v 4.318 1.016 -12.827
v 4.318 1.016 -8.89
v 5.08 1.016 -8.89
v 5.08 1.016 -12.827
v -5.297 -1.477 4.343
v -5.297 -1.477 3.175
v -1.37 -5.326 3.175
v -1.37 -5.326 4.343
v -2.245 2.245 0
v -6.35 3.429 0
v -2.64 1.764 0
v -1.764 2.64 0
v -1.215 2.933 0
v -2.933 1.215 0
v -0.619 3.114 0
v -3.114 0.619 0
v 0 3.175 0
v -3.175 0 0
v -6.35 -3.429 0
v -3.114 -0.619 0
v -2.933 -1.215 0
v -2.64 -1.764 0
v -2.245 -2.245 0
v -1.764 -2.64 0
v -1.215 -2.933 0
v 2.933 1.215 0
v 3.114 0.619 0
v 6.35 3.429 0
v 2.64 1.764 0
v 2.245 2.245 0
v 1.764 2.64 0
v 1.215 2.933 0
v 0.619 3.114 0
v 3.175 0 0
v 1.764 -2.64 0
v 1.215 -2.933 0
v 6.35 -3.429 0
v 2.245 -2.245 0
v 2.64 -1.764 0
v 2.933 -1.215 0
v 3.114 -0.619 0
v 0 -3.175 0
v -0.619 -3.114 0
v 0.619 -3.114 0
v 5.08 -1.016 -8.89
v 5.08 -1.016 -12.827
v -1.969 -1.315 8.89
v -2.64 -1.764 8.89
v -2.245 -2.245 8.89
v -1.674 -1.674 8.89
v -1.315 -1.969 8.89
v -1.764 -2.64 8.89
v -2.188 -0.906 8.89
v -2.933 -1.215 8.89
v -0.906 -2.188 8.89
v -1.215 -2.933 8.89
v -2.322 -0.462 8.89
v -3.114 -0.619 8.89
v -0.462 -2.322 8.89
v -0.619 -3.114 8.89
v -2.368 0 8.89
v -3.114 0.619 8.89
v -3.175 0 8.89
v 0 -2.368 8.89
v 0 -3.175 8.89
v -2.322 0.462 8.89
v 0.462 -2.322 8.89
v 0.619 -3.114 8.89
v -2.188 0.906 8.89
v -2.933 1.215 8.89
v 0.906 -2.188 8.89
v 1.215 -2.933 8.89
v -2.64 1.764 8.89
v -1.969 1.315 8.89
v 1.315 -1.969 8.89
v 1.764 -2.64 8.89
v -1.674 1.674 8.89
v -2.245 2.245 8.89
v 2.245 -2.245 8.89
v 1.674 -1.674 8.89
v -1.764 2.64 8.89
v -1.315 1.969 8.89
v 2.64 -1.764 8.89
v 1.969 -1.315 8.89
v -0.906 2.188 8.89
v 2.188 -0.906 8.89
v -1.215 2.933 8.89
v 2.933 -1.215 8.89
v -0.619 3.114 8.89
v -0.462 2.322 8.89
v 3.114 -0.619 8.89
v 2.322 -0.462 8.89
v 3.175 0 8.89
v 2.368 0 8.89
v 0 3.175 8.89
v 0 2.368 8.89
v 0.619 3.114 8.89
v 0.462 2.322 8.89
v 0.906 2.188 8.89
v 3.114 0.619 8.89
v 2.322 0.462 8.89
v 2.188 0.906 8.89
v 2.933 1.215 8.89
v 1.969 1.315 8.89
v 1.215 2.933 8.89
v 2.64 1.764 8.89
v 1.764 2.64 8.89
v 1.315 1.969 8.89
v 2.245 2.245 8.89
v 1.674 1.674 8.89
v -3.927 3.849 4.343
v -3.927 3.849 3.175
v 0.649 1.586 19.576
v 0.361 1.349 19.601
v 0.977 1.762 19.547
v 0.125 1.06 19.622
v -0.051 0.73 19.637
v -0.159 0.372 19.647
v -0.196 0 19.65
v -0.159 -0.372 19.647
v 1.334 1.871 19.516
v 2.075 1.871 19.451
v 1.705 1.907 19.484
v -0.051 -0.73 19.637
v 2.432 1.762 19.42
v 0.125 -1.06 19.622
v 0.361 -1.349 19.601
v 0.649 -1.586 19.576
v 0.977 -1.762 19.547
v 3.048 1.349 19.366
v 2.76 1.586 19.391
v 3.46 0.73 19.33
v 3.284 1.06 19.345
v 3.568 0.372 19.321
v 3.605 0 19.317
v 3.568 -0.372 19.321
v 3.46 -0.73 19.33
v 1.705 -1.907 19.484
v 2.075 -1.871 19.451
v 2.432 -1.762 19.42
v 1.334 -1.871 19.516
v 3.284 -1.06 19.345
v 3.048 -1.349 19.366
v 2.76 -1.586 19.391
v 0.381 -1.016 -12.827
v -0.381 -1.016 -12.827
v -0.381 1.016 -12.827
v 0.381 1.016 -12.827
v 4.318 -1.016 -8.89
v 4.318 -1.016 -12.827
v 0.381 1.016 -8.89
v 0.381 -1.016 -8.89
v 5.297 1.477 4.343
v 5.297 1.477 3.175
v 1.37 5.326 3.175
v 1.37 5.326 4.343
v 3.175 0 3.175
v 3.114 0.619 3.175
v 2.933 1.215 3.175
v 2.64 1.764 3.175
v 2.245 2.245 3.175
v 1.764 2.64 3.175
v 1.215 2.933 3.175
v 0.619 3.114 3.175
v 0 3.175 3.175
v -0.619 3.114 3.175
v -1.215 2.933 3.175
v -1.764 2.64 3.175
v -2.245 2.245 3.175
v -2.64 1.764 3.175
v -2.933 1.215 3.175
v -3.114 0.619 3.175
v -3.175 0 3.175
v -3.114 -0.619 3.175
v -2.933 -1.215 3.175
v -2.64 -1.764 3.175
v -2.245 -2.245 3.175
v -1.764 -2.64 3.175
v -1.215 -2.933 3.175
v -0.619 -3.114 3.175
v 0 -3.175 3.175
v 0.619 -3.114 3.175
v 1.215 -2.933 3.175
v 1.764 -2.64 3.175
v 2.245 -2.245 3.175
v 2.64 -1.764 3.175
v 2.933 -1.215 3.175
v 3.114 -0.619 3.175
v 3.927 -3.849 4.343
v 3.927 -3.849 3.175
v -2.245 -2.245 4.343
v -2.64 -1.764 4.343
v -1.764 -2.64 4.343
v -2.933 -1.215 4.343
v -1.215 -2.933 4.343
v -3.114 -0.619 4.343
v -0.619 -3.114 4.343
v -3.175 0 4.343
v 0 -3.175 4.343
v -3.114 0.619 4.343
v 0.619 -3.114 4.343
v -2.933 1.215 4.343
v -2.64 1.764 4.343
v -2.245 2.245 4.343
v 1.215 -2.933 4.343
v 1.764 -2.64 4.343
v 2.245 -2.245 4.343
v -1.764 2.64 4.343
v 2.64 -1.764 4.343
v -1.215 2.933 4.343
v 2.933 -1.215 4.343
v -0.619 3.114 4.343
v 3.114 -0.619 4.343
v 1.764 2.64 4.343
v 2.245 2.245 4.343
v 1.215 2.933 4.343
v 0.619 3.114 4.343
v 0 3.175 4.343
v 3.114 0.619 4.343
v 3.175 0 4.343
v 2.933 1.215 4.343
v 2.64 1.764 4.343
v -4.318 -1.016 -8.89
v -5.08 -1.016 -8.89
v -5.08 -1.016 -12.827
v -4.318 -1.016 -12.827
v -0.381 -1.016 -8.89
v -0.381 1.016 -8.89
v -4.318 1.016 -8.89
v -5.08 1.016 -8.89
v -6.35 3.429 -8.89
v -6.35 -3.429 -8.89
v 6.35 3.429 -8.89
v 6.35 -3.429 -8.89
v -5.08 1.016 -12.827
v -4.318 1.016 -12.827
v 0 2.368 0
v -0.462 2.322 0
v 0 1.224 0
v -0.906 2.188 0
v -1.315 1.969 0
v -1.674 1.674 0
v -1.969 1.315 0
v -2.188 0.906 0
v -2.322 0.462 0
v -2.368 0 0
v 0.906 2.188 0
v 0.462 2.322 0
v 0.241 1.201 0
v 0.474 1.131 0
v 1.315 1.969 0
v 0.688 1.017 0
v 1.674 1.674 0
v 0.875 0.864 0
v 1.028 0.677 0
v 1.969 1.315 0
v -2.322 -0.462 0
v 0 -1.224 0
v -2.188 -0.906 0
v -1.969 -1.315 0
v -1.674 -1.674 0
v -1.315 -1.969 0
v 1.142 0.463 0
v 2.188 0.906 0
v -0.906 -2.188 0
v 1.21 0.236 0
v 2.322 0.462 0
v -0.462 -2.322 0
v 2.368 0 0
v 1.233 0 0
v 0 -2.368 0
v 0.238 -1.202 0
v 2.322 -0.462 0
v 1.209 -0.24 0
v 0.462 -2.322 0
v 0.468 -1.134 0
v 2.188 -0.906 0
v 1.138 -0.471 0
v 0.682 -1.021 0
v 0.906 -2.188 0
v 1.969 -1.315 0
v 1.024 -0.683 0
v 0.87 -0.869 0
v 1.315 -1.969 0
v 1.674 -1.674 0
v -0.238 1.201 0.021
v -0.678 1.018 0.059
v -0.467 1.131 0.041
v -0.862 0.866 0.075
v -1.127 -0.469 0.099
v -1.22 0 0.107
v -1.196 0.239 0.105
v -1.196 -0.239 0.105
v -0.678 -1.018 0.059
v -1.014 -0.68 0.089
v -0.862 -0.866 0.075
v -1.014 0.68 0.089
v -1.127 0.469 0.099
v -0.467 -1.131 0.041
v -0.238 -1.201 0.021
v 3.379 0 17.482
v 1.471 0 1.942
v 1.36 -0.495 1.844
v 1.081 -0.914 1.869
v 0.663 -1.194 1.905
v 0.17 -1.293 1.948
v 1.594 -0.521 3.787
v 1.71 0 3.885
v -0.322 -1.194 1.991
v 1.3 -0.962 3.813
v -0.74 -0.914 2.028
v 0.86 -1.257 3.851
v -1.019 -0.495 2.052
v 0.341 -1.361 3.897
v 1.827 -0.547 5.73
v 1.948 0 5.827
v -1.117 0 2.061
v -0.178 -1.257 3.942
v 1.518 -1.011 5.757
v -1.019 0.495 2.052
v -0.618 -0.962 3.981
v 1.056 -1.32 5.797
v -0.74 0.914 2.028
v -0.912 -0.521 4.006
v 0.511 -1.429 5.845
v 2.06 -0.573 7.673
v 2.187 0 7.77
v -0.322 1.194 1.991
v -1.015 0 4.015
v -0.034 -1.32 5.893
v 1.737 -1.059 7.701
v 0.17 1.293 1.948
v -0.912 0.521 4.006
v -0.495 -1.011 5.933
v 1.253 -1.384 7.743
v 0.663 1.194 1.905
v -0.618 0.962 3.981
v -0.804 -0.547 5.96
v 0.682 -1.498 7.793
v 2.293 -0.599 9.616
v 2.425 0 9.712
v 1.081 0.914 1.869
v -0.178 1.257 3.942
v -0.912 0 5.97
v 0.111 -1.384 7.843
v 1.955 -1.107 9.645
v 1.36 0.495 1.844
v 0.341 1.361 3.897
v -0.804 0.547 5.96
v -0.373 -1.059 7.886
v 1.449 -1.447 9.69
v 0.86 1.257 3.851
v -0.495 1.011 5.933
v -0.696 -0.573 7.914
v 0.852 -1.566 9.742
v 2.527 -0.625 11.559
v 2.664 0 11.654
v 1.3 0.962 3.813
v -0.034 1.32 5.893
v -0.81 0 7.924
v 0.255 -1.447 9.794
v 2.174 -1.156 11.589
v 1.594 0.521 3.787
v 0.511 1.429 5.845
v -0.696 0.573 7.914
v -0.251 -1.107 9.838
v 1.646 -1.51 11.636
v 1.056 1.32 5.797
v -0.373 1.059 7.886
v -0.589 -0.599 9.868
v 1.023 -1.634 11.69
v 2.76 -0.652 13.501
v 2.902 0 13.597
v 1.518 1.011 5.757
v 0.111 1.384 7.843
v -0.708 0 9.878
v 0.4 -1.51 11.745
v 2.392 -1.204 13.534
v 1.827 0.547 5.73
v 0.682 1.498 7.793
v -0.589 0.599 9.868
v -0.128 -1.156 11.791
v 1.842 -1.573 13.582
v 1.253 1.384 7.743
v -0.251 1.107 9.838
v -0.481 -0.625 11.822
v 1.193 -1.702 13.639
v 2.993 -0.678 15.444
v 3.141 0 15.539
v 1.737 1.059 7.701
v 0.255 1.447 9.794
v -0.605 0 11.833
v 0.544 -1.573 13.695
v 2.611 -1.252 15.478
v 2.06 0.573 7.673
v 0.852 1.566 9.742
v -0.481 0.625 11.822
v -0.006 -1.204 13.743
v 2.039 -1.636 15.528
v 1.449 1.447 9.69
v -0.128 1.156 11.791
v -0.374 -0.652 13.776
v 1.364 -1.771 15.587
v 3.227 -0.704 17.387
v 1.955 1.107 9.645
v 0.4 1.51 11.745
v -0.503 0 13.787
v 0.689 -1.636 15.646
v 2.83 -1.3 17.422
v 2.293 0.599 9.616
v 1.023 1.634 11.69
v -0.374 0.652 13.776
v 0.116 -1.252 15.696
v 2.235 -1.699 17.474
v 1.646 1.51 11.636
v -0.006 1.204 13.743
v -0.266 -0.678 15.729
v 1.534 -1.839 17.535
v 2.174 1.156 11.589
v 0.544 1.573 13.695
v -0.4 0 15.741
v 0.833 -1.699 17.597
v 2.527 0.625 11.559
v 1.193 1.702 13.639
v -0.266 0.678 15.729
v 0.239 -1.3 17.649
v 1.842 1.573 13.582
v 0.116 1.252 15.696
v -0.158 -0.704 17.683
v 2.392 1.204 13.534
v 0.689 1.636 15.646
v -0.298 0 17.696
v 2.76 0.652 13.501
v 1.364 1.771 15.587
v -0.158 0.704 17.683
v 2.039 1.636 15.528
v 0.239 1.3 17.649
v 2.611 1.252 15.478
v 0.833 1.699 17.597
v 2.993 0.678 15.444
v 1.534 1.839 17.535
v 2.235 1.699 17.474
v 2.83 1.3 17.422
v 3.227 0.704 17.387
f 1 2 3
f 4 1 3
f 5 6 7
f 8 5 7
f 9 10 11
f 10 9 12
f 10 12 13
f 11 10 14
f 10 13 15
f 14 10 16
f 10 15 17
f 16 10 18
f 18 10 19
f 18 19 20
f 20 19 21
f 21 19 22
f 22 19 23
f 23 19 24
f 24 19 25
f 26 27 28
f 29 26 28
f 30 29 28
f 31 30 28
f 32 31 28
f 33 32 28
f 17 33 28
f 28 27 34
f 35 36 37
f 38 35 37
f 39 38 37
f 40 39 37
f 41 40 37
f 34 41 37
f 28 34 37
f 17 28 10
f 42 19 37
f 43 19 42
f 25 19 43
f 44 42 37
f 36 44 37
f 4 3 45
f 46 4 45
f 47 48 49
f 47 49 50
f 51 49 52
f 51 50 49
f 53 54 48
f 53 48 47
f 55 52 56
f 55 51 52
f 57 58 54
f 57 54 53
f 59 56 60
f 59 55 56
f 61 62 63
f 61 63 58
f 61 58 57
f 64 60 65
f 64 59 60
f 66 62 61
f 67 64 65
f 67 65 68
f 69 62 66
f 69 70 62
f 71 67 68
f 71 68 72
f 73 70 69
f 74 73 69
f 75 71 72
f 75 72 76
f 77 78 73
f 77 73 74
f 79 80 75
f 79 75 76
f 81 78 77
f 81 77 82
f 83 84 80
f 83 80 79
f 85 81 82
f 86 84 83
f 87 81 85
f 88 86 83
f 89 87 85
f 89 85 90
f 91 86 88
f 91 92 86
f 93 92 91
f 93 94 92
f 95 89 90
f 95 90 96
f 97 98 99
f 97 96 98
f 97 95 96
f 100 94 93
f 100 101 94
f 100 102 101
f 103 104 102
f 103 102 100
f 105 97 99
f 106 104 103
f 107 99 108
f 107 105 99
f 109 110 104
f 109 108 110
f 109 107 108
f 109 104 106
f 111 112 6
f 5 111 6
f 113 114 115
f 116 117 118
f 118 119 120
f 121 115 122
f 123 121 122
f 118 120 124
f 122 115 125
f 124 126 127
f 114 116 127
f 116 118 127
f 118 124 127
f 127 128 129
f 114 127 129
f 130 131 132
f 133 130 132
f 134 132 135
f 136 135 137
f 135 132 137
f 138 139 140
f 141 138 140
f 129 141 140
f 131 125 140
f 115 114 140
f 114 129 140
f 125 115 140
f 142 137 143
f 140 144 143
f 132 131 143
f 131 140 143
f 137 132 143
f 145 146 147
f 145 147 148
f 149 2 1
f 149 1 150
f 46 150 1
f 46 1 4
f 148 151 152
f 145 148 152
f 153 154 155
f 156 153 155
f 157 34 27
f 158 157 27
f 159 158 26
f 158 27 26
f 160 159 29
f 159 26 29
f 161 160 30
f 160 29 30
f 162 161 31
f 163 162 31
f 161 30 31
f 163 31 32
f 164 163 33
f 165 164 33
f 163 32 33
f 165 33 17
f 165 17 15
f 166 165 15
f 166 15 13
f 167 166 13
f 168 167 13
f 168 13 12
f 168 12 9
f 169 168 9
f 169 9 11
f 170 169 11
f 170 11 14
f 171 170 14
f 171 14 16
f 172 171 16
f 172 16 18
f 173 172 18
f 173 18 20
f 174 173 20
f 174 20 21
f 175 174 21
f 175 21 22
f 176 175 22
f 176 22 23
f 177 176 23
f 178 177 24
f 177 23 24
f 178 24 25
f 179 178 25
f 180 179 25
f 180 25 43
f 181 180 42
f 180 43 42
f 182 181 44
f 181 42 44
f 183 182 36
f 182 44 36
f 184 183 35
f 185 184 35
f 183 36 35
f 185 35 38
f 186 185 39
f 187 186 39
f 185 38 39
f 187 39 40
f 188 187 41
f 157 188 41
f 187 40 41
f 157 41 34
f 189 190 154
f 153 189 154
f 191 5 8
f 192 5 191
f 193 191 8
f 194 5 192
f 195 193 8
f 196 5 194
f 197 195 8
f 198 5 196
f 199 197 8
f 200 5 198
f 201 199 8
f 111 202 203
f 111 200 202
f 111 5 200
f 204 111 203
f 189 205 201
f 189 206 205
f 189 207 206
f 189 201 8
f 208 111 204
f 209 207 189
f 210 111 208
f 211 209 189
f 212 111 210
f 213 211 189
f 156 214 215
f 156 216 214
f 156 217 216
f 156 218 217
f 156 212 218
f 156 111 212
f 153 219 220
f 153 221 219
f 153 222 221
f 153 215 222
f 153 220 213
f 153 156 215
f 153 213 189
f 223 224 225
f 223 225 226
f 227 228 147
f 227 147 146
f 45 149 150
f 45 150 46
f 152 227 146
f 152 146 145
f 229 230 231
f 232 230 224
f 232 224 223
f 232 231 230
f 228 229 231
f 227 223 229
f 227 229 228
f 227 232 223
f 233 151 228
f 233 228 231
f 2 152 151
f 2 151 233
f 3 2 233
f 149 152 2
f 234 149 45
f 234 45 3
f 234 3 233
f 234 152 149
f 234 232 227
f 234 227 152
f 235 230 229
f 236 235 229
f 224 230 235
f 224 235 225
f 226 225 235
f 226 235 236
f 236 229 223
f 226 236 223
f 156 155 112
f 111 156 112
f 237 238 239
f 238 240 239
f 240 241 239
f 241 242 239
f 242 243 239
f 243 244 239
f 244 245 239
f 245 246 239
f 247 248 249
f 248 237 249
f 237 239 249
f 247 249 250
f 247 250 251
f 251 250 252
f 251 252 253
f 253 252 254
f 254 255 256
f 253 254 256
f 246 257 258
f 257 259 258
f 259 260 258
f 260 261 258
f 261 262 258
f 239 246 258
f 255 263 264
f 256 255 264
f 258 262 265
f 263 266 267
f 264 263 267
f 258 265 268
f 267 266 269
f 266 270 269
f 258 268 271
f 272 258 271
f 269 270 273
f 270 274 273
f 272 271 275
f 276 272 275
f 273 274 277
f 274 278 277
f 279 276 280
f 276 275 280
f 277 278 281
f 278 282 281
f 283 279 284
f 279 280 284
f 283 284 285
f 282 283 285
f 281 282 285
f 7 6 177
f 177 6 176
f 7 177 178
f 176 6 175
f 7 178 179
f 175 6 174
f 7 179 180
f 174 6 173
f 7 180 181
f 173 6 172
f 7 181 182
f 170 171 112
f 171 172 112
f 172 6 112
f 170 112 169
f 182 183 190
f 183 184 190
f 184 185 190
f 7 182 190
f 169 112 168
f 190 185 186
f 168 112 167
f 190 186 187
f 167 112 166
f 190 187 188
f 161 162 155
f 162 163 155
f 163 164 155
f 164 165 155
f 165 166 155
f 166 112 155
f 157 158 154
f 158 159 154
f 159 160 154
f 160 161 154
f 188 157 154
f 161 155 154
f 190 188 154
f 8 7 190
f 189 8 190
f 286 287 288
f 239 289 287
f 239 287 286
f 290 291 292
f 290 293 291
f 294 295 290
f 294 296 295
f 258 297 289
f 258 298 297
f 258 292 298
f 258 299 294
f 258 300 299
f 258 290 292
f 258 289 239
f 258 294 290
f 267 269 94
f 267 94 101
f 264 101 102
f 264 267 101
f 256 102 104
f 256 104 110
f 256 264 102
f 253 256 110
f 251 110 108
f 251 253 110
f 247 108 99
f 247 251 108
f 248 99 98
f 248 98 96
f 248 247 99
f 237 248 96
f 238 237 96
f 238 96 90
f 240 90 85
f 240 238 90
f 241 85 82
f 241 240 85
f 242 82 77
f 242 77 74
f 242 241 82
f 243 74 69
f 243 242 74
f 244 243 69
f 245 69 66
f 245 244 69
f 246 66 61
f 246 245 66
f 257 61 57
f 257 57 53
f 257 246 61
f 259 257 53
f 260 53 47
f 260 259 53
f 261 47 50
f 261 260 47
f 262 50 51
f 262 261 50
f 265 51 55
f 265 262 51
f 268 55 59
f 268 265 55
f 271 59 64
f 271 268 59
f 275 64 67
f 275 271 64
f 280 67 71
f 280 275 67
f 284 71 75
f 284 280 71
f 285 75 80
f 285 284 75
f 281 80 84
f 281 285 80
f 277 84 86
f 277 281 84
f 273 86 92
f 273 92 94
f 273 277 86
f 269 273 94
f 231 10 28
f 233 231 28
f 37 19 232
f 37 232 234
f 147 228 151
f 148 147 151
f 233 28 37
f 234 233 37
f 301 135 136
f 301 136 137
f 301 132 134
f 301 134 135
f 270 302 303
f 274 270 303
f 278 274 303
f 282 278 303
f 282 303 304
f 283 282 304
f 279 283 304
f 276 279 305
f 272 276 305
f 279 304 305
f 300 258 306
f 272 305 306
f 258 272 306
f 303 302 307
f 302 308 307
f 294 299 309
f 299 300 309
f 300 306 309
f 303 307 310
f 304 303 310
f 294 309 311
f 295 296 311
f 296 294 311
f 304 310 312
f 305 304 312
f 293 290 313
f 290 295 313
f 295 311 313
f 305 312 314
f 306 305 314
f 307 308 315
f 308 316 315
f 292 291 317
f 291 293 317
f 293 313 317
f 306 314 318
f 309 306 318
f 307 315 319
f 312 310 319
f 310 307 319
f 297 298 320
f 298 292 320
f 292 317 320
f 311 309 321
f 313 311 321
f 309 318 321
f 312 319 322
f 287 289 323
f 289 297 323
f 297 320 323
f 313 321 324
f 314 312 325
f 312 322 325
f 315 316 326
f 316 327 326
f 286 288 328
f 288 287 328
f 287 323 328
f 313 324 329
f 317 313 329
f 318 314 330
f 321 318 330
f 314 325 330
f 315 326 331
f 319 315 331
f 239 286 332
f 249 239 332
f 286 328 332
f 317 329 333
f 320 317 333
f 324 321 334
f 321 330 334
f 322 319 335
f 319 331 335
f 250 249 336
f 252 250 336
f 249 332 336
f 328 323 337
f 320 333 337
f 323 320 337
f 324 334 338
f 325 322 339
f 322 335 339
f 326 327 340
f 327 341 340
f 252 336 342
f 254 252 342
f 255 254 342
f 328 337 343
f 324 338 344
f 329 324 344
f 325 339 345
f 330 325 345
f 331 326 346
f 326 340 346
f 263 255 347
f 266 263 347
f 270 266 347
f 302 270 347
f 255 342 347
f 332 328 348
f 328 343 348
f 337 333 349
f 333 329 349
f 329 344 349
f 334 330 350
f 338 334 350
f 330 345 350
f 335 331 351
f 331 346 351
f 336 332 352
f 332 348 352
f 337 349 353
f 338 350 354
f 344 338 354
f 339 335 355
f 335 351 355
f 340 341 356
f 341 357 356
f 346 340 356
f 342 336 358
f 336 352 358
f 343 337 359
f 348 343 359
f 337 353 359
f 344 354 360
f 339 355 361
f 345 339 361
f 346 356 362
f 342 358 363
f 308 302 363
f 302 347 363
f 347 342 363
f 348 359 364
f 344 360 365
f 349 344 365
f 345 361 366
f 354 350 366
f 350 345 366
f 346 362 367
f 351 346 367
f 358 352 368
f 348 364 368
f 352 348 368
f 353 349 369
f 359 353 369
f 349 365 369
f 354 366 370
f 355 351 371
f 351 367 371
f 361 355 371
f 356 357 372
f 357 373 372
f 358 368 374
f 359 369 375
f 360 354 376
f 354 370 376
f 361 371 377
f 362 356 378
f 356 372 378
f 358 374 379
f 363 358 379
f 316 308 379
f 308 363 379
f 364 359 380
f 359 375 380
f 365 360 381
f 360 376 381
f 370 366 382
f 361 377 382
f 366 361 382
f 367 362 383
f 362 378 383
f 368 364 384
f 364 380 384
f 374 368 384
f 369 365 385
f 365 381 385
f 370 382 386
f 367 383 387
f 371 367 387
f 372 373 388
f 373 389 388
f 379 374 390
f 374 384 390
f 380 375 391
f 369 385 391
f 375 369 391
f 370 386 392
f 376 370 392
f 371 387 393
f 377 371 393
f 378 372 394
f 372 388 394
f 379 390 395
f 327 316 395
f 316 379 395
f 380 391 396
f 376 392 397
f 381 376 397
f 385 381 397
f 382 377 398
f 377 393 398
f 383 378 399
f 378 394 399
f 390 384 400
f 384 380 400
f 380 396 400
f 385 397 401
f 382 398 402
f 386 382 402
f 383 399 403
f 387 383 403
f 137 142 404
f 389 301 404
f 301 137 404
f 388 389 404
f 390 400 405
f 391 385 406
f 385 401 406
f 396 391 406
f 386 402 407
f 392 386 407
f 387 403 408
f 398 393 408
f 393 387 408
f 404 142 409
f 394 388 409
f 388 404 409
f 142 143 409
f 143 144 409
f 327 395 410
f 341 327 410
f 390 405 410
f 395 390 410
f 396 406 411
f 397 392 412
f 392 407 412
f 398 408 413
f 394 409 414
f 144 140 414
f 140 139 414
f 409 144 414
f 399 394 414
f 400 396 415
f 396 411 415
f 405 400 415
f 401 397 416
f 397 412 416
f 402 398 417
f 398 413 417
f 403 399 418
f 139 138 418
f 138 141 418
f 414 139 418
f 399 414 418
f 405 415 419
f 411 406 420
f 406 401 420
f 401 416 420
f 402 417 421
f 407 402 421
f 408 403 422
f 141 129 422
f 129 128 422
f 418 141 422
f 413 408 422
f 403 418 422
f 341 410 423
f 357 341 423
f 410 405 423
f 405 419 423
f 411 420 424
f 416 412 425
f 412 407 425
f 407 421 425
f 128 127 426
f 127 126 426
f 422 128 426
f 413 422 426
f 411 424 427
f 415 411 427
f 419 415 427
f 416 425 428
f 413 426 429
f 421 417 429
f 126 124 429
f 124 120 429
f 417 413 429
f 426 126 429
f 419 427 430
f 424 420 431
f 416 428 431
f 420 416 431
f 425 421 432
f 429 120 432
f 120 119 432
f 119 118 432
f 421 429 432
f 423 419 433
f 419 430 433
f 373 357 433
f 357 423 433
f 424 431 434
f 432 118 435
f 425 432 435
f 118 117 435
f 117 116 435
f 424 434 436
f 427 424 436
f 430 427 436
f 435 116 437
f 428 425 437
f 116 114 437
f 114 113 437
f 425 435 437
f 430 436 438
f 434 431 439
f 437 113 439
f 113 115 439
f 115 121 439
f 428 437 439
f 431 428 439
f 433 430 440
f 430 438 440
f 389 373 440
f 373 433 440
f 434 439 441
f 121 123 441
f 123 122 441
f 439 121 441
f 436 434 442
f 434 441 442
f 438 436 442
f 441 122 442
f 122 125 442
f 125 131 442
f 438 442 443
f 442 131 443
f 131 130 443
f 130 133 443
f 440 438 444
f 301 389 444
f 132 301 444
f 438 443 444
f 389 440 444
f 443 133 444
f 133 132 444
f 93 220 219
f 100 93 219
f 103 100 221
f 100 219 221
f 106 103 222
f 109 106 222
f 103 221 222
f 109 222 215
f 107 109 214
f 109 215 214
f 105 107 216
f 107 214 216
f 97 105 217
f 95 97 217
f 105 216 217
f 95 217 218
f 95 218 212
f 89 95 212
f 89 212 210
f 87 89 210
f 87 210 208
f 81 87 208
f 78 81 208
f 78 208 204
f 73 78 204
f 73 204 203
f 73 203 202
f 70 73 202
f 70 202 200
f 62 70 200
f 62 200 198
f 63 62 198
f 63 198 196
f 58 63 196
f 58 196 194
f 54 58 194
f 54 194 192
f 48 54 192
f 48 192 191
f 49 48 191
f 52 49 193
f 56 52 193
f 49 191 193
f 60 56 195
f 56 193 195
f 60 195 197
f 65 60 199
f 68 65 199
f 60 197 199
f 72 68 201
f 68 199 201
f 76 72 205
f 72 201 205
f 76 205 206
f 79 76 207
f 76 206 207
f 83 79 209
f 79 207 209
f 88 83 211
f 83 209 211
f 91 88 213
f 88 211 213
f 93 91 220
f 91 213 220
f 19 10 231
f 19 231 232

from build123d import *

# Parameters (mm, degrees)
F0_R      = 3.175
F0_R_2    = 2.3677964523
F1_DEPTH  = 8.89
F2_W      = 12.7
F2_H      = 6.858
F3_DEPTH  = 8.89
F4_W      = 0.762
F4_H      = 2.032
F5_DEPTH  = 3.937
F7_R      = 3.175
F8_DEPTH  = 1.1684
F11_R     = 1.2243851264
F12_DEPTH = 19.558
F12_TAPER = -2


with BuildPart() as f1:
    # F0 (on Top) → F1 (new body)
    with BuildSketch(Plane.XY):
        Circle(F0_R)
        Circle(F0_R_2, mode=Mode.SUBTRACT)
    extrude(amount=F1_DEPTH)

    # F2 (on face) → F3 (join)
    with BuildSketch(Plane(origin=(0, 0, 0), x_dir=(1, 0, 0), z_dir=(0, 0, -1))):
        Rectangle(F2_W, F2_H)
    extrude(amount=F3_DEPTH)

    # F4 (on face) → F5 (join)
    with BuildSketch(Plane(origin=(0, 0, -8.89), x_dir=(1, 0, 0), z_dir=(0, 0, -1))):
        with Locations((-4.699, 0)):
            Rectangle(F4_W, F4_H)
        Rectangle(F4_W, F4_H)
        with Locations((4.699, 0)):
            Rectangle(F4_W, F4_H)
    extrude(amount=F5_DEPTH)

    # F7 (on offset) → F8 (join)
    with BuildSketch(Plane.XY.offset(3.175)):
        Polygon((-5.297310009, -1.4766115498), (-1.3698718908, -5.3259108144), (3.9274381181, -3.8492992646), (5.297310009, 1.4766115498), (1.3698718908, 5.3259108144), (-3.9274381181, 3.8492992646), align=None)
        Circle(F7_R, mode=Mode.SUBTRACT)
    extrude(amount=F8_DEPTH)

    # F11 (on line) → F12 (join)
    with BuildSketch(Plane(origin=(0, 0, 0), x_dir=(0.9961946981, 0, -0.0871557427), z_dir=(-0.0871557427, 0, -0.9961946981))):
        Circle(F11_R)
    extrude(amount=-F12_DEPTH, taper=F12_TAPER)


solid = f1.part
